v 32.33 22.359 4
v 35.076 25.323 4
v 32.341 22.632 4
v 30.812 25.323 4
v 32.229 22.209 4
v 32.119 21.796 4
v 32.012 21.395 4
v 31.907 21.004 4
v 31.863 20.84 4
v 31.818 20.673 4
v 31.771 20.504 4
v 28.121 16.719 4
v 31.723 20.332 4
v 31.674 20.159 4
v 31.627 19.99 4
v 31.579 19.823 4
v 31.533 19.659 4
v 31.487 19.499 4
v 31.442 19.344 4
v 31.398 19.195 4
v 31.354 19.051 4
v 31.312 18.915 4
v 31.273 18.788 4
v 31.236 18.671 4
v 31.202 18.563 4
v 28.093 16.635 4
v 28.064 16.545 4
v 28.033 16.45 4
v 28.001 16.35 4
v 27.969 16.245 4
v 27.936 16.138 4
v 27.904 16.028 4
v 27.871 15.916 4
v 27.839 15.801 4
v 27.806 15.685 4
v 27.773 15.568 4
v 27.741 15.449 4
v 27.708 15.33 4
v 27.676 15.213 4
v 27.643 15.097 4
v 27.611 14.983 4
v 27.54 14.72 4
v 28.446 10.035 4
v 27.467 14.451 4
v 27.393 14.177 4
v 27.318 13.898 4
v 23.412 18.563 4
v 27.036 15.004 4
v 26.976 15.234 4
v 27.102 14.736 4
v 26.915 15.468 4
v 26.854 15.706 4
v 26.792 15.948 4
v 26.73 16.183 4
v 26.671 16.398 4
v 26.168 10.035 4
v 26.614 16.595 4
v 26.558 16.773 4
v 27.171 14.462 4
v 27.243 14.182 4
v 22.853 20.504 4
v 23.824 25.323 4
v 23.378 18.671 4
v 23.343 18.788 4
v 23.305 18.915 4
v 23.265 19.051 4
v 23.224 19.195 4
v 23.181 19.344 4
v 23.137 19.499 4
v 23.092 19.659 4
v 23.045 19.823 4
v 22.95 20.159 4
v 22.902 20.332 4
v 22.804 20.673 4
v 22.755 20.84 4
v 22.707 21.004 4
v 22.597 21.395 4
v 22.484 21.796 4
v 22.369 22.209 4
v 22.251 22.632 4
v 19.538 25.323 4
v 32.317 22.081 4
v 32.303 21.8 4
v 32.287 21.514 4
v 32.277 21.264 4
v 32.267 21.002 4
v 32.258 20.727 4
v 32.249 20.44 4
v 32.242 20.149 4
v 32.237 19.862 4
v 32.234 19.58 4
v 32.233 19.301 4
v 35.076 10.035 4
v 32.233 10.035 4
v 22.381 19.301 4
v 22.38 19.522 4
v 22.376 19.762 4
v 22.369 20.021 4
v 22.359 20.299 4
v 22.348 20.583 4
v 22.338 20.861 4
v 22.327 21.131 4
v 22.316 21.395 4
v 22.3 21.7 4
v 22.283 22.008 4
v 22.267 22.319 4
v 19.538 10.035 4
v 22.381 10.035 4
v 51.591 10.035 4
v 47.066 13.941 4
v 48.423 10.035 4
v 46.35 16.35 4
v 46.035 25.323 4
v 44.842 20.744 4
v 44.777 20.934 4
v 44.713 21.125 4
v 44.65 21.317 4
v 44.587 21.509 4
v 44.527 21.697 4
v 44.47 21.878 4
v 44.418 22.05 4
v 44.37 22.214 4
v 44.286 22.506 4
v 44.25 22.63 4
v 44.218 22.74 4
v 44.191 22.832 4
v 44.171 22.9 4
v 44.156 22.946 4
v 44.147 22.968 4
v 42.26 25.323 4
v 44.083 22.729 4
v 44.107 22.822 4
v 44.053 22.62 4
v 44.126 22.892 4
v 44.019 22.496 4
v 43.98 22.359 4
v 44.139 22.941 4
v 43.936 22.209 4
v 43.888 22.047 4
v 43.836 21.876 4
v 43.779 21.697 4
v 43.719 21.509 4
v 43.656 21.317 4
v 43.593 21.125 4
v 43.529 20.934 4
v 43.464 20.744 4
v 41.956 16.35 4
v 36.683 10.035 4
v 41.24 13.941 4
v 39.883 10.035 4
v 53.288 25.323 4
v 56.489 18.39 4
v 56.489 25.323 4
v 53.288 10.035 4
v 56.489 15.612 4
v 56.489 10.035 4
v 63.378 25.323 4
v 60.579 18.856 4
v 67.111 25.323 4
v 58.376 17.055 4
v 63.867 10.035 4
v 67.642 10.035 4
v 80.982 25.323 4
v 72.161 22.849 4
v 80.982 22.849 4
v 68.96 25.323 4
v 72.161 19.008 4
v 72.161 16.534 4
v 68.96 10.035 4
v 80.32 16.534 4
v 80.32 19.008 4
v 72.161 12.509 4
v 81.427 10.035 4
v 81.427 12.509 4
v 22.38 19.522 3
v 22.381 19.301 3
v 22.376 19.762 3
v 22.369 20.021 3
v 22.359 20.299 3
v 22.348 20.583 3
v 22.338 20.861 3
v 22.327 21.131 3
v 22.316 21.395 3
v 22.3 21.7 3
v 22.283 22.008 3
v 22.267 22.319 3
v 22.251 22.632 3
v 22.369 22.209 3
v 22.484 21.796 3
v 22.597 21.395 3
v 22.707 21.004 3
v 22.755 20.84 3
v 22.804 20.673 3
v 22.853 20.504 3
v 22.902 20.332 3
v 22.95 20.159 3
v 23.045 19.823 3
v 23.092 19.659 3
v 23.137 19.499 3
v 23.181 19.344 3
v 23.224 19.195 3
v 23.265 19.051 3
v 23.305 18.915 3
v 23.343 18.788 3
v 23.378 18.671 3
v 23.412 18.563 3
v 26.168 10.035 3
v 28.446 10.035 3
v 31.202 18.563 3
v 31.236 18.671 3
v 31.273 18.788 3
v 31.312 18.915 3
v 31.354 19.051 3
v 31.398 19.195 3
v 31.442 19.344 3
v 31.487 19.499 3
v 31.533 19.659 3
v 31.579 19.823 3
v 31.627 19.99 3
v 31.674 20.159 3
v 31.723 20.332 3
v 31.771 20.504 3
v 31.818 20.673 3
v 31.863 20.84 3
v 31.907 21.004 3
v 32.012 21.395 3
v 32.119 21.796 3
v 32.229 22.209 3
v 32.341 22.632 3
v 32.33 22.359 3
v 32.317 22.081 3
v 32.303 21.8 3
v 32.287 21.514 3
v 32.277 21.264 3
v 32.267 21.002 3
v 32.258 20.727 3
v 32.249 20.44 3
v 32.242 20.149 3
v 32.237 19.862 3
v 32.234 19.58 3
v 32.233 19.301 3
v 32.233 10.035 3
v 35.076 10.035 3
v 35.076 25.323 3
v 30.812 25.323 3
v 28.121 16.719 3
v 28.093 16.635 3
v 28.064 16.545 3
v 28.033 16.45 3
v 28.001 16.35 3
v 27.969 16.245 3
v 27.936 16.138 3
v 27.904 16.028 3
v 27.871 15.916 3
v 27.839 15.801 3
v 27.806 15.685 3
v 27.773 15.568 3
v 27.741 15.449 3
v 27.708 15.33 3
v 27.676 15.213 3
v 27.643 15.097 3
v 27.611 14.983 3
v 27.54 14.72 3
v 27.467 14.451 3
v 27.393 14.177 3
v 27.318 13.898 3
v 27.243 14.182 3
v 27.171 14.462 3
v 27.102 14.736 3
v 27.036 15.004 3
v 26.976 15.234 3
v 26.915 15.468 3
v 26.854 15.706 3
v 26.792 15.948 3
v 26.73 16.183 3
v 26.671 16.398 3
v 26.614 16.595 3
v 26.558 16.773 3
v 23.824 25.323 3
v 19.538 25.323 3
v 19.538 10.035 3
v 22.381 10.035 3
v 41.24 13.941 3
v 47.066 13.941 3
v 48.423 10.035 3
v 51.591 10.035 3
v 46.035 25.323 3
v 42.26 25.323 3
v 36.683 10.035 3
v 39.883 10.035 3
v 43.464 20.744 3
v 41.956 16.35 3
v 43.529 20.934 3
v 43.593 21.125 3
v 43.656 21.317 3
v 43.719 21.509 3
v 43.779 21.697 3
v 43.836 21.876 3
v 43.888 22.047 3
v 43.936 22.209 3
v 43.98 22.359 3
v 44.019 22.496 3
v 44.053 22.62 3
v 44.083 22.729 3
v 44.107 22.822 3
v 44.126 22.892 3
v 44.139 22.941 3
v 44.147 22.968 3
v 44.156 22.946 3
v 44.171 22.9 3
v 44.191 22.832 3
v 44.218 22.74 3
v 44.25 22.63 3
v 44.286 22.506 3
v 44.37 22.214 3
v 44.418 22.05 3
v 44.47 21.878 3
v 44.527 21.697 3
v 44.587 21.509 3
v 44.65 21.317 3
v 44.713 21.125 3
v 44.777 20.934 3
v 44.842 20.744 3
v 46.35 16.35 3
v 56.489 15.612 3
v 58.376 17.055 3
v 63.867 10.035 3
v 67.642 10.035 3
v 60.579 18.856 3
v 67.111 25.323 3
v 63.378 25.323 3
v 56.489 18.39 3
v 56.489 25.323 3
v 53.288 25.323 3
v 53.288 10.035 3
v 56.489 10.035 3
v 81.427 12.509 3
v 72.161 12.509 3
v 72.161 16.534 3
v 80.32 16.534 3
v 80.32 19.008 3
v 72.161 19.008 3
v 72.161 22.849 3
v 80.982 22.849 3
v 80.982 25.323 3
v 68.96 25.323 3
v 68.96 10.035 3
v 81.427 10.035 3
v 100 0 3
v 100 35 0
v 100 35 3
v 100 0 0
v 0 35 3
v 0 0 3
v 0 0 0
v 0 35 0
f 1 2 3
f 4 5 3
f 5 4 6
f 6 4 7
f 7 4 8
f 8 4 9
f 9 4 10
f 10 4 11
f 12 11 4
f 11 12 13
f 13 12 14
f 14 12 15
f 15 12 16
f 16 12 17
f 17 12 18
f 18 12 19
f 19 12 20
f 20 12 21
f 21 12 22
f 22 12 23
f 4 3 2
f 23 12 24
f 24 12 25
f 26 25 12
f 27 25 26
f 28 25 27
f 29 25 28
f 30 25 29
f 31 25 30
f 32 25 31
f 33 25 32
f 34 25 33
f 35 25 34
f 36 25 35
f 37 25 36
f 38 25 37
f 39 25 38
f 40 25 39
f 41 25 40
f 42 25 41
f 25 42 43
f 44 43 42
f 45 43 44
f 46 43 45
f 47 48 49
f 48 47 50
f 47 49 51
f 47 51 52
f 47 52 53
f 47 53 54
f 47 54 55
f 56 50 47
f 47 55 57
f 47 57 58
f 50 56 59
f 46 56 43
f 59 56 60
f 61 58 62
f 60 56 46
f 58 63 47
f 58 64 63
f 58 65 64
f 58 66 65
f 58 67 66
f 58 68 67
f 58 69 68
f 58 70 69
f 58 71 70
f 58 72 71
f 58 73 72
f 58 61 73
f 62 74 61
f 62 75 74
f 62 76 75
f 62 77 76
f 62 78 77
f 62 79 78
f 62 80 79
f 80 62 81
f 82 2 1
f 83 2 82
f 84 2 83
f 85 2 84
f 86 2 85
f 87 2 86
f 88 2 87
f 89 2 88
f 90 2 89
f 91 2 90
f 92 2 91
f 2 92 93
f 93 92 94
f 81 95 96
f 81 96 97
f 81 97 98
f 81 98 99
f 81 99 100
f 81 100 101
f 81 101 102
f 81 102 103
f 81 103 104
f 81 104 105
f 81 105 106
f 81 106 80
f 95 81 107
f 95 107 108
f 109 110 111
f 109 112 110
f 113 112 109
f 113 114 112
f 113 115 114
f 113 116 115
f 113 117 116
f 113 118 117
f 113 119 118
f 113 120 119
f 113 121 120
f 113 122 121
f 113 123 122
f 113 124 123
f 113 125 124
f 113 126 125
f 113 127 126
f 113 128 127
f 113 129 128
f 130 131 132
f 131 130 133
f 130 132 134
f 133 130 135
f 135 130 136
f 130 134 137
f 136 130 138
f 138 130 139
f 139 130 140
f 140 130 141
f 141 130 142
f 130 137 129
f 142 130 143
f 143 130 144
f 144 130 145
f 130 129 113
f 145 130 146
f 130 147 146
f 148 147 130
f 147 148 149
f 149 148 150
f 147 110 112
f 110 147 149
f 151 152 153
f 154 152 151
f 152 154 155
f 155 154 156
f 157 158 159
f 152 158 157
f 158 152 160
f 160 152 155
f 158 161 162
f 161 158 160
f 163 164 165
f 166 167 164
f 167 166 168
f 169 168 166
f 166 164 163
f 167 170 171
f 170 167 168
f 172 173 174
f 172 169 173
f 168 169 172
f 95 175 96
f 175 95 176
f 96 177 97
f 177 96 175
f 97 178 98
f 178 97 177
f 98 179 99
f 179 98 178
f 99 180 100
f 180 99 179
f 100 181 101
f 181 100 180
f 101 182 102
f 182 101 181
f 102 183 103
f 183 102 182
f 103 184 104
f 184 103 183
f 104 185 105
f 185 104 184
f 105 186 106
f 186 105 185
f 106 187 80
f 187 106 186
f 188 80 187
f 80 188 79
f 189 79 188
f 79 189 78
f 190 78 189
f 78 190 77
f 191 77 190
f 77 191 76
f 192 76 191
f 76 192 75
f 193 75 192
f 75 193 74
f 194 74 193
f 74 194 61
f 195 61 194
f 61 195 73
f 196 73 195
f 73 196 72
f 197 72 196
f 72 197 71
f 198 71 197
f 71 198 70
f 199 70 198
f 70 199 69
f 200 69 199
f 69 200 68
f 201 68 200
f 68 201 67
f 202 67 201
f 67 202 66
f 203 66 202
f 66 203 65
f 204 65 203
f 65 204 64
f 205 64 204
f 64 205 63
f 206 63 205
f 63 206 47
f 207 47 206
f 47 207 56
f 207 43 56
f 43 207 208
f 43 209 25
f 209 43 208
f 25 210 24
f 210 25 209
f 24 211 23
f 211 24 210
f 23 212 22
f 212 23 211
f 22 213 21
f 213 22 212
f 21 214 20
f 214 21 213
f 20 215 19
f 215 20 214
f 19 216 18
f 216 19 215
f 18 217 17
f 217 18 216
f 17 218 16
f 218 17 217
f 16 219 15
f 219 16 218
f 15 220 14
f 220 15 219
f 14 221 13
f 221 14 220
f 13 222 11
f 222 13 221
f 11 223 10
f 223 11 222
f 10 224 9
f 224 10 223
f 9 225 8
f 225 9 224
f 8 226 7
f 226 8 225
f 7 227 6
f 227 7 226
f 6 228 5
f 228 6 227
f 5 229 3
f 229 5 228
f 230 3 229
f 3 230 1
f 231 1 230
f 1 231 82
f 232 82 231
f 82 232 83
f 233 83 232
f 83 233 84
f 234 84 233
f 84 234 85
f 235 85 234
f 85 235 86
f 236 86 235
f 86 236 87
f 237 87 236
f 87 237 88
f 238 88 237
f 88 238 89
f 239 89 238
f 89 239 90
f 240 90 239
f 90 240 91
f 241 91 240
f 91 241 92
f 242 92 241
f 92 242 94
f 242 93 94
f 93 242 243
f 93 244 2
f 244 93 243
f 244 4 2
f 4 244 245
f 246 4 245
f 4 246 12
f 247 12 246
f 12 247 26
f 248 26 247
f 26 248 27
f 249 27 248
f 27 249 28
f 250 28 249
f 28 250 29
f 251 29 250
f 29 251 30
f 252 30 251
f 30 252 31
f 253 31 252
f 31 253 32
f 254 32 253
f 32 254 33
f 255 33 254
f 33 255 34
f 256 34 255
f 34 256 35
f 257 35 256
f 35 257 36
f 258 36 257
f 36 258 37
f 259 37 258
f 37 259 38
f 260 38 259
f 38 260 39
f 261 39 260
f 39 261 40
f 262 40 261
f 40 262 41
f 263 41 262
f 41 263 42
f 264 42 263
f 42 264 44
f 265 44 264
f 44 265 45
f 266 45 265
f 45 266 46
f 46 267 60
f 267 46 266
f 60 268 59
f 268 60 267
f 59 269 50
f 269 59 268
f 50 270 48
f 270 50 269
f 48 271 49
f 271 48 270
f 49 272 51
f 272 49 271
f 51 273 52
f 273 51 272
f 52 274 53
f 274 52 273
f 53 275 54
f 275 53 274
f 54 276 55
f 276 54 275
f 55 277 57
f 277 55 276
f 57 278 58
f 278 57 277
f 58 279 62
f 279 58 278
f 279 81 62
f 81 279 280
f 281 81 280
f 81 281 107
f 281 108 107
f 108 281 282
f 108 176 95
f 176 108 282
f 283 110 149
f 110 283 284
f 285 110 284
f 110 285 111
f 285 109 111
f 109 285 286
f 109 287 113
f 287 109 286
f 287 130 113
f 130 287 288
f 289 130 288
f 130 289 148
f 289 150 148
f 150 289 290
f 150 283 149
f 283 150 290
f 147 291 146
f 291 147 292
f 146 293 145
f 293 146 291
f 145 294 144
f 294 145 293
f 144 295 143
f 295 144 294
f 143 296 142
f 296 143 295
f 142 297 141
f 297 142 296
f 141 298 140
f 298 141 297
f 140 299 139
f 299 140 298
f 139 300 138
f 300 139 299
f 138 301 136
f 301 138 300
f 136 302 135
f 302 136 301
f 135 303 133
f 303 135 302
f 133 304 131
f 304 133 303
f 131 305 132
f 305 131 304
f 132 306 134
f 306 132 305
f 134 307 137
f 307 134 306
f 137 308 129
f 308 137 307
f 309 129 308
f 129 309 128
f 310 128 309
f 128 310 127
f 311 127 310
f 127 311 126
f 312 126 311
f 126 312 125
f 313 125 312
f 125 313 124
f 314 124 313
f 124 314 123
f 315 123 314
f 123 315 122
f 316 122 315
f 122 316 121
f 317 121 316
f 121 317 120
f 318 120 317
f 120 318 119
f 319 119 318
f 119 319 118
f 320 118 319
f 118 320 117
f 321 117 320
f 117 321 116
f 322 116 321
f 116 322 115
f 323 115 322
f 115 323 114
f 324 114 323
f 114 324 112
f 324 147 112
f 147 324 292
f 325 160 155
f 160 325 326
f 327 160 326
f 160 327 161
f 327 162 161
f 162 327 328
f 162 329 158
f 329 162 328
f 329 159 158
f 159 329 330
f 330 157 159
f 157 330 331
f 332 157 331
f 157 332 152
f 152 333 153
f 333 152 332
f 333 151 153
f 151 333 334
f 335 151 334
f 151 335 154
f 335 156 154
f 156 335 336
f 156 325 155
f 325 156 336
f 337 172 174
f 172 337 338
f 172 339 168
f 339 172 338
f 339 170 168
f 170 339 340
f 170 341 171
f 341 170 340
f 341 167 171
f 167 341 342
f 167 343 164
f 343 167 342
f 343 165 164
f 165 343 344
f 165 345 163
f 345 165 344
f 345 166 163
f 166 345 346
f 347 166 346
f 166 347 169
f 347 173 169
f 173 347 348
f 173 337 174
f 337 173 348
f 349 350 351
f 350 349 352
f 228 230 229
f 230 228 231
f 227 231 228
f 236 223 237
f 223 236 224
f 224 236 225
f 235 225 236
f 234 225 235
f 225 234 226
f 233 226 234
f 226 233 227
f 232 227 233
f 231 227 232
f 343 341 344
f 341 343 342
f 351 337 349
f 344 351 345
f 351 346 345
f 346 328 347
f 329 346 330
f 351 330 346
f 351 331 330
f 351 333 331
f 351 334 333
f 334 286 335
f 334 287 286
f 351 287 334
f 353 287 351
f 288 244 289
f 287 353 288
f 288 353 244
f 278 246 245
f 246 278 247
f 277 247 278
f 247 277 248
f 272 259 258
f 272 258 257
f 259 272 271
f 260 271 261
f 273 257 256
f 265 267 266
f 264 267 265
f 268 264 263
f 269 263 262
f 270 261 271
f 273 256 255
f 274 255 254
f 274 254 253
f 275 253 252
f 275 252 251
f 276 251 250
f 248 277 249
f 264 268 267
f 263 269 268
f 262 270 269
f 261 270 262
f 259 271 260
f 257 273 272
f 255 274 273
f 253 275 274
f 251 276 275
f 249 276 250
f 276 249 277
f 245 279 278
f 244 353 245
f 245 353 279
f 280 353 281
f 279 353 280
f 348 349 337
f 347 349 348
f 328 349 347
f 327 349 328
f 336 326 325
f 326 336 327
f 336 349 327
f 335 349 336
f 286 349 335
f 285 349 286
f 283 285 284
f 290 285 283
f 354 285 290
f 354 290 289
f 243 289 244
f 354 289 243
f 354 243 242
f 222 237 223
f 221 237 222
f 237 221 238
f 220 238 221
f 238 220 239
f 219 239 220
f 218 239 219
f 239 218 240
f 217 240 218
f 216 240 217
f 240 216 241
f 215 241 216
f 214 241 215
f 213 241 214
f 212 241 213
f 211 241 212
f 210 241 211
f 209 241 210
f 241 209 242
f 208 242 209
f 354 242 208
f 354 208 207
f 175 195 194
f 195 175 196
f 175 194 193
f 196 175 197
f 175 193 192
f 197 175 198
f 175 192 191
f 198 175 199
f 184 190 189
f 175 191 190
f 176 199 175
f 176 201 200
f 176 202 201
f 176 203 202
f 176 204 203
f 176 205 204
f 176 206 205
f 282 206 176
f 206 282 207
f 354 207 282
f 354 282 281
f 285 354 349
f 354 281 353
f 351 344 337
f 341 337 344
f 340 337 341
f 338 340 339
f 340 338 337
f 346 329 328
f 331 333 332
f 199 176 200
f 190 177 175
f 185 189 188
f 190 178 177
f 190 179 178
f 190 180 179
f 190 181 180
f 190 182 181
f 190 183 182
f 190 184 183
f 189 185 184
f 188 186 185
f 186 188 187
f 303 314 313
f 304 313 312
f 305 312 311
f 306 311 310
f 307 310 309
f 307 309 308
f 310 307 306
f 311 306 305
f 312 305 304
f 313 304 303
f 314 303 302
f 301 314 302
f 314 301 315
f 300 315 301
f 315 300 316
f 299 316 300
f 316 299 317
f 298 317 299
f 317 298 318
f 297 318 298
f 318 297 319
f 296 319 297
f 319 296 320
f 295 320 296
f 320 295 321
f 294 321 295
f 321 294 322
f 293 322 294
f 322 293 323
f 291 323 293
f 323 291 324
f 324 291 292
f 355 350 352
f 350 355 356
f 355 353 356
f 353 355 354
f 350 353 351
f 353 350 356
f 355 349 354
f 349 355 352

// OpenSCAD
// Millimeters. Union export for a verified layer-based color change.
// STL carries geometry, not filament assignments or pause commands.
part = "sign"; // sign, coupon
label = "MAKE";
font_name = "Liberation Sans:style=Bold"; // inspect resolved font and all glyphs
letter_size = 16;
base_length = 100;
base_width = 35;
base_thickness = 3;
letter_height = 1;
coupon_length = 40;
coupon_width = 35;
coupon_center_x = 50; // move crop to include critical strokes; do not scale text
coupon_center_y = 17.5;
epsilon = 0.01;
assert(part=="sign" || part=="coupon", "Unknown part");
assert(len(label)>0 && min(letter_size,base_length,base_width,base_thickness,letter_height)>0, "Positive dimensions and nonempty text required");
assert(coupon_length>0 && coupon_width>0 && coupon_length<=base_length && coupon_width<=base_width, "Invalid coupon size");
assert(coupon_center_x>=coupon_length/2 && coupon_center_x<=base_length-coupon_length/2 && coupon_center_y>=coupon_width/2 && coupon_center_y<=base_width-coupon_width/2, "Coupon must lie within base");
// Font metrics vary; clipping is intentional protection against overhanging text.
// Inspect for clipping and missing glyphs before accepting any customized text.
module sign() {
    union() {
        cube([base_length,base_width,base_thickness]);
        intersection() {
            translate([base_length/2,base_width/2,base_thickness-epsilon])
                linear_extrude(height=letter_height+epsilon)
                text(label,size=letter_size,font=font_name,halign="center",valign="center");
            cube([base_length,base_width,base_thickness+letter_height]);
        }
    }
}
if (part=="sign") sign();
if (part=="coupon") intersection() {
    sign();
    translate([coupon_center_x-coupon_length/2,coupon_center_y-coupon_width/2,-epsilon])
        cube([coupon_length,coupon_width,base_thickness+letter_height+2*epsilon]);
}
